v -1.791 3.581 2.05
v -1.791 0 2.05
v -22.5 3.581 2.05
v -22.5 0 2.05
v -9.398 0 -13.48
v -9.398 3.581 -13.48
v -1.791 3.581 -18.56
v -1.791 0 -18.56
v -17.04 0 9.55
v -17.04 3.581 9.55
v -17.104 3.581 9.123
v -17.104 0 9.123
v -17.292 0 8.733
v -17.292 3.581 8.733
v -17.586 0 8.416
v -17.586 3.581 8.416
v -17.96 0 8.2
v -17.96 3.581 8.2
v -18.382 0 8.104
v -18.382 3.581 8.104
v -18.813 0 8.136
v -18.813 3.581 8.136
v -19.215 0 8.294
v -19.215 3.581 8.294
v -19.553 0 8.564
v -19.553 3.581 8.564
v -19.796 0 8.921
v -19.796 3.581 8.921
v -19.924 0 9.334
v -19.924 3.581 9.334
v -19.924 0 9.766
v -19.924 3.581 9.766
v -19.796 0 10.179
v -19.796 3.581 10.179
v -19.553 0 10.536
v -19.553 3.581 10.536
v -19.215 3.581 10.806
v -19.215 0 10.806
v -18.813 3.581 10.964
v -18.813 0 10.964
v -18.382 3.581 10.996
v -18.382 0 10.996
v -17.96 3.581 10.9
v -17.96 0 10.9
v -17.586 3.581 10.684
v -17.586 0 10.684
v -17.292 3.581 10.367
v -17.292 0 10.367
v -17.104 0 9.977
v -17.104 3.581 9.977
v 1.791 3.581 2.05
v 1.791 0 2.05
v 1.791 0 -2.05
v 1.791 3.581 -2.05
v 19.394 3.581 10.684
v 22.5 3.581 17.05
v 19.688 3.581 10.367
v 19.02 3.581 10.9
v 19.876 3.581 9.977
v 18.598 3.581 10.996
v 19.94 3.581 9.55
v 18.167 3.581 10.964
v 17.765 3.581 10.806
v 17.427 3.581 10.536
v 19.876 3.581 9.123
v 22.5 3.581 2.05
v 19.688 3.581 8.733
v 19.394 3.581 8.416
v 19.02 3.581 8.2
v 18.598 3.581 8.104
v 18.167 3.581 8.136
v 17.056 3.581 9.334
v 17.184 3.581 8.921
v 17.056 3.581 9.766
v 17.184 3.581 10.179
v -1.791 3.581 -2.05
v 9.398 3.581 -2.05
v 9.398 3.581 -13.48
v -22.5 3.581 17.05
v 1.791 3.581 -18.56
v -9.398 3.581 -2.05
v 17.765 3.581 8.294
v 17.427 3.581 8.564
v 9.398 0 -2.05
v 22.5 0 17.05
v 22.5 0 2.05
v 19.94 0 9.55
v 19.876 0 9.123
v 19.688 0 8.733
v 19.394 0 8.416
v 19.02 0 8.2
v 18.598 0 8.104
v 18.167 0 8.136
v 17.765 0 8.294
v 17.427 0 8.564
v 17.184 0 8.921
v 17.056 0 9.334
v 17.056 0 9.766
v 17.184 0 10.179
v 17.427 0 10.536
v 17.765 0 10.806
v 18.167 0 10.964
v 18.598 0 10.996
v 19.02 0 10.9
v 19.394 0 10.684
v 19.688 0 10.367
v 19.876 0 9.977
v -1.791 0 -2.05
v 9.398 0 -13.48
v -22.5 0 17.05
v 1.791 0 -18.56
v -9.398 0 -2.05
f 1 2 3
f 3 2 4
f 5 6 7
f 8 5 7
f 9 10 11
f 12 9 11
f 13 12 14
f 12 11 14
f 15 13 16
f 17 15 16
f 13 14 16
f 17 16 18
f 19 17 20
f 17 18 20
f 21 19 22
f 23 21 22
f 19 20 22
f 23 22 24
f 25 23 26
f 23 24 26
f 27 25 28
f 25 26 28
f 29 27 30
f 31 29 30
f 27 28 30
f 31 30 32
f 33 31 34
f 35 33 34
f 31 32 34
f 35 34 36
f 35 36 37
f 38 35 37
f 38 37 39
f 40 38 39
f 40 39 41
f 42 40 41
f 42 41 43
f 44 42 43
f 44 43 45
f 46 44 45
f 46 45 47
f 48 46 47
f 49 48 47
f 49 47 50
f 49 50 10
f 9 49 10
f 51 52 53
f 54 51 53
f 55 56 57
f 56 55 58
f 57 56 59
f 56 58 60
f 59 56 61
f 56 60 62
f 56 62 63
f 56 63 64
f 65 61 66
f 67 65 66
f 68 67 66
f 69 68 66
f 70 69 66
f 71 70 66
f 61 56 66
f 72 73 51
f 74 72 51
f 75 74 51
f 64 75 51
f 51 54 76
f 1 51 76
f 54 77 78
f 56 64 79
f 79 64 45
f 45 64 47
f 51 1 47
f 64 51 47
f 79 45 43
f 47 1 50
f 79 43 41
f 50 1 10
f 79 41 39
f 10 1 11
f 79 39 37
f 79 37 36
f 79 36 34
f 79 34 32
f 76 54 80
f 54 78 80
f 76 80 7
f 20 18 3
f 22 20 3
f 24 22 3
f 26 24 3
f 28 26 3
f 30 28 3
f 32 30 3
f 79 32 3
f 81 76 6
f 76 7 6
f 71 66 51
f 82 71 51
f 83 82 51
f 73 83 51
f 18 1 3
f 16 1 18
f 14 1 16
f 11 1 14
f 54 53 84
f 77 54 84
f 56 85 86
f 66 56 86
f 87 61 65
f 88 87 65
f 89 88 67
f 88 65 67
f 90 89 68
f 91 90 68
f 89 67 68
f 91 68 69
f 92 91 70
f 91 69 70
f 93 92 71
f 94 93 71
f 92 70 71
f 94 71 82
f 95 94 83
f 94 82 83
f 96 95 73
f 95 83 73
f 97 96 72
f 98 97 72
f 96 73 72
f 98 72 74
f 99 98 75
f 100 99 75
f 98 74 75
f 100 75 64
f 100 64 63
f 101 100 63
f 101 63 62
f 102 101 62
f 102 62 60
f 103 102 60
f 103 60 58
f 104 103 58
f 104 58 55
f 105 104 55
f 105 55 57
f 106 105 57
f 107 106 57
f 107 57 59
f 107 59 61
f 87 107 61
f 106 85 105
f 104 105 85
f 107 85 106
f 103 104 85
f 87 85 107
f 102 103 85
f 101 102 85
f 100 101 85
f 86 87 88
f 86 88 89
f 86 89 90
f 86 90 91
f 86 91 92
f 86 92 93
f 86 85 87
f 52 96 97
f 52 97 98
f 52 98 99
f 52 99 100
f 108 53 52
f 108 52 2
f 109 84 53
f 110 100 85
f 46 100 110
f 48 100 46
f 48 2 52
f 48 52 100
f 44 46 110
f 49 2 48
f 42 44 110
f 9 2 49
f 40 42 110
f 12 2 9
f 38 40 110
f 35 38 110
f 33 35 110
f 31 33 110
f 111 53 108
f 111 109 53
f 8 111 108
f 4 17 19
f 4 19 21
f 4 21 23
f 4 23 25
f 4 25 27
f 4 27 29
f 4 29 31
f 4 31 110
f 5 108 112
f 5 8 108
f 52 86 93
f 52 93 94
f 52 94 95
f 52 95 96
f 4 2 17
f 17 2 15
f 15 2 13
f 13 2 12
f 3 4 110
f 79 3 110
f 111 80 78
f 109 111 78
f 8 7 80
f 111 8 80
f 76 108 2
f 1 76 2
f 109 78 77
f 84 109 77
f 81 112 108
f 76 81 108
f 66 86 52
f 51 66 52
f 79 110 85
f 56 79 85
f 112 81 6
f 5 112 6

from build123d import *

# Parameters (mm, degrees)
BOSS_EXTRUDE1_DEPTH = 3.5814
SKETCH2_R           = 1.45
CUT_EXTRUDE1_DEPTH  = 4.5814
BOSS_EXTRUDE2_DEPTH = 3.5814


with BuildPart() as part:
    # Sketch1 → Boss-Extrude1 (new body)
    with BuildSketch(Plane(origin=(0, 0, 0), x_dir=(1, 0, 0), z_dir=(0, 1, 0))):
        Polygon((-22.5, -17.05), (22.5, -17.05), (22.5, -2.05), (1.7907, -2.05), (1.7907, 2.05), (9.398, 2.05), (1.7907, 7.13), (-1.7907, 7.13), (-9.398, 2.05), (-1.7907, 2.05), (-1.7907, -2.05), (-22.5, -2.05), align=None)
    extrude(amount=BOSS_EXTRUDE1_DEPTH)

    # Sketch2 → Cut-Extrude1 (cut, through all)
    with BuildSketch(Plane(origin=(0, 3.5814, 0), x_dir=(1, 0, 0), z_dir=(0, 1, 0))):
        with Locations((-18.49, -9.55)):
            Circle(SKETCH2_R)
        with Locations((18.49, -9.55)):
            Circle(SKETCH2_R)
    extrude(amount=-CUT_EXTRUDE1_DEPTH, mode=Mode.SUBTRACT)

    # Sketch3 → Boss-Extrude2 (add)
    with BuildSketch(Plane(origin=(0, 3.5814, 0), x_dir=(1, 0, 0), z_dir=(0, 1, 0))):
        Polygon((1.7907, 18.56), (9.398, 13.48), (9.398, 2.05), (1.7907, 7.13), (-1.7907, 7.13), (-9.398, 2.05), (-9.398, 13.48), (-1.7907, 18.56), align=None)
    extrude(amount=-BOSS_EXTRUDE2_DEPTH)


solid = part.part
